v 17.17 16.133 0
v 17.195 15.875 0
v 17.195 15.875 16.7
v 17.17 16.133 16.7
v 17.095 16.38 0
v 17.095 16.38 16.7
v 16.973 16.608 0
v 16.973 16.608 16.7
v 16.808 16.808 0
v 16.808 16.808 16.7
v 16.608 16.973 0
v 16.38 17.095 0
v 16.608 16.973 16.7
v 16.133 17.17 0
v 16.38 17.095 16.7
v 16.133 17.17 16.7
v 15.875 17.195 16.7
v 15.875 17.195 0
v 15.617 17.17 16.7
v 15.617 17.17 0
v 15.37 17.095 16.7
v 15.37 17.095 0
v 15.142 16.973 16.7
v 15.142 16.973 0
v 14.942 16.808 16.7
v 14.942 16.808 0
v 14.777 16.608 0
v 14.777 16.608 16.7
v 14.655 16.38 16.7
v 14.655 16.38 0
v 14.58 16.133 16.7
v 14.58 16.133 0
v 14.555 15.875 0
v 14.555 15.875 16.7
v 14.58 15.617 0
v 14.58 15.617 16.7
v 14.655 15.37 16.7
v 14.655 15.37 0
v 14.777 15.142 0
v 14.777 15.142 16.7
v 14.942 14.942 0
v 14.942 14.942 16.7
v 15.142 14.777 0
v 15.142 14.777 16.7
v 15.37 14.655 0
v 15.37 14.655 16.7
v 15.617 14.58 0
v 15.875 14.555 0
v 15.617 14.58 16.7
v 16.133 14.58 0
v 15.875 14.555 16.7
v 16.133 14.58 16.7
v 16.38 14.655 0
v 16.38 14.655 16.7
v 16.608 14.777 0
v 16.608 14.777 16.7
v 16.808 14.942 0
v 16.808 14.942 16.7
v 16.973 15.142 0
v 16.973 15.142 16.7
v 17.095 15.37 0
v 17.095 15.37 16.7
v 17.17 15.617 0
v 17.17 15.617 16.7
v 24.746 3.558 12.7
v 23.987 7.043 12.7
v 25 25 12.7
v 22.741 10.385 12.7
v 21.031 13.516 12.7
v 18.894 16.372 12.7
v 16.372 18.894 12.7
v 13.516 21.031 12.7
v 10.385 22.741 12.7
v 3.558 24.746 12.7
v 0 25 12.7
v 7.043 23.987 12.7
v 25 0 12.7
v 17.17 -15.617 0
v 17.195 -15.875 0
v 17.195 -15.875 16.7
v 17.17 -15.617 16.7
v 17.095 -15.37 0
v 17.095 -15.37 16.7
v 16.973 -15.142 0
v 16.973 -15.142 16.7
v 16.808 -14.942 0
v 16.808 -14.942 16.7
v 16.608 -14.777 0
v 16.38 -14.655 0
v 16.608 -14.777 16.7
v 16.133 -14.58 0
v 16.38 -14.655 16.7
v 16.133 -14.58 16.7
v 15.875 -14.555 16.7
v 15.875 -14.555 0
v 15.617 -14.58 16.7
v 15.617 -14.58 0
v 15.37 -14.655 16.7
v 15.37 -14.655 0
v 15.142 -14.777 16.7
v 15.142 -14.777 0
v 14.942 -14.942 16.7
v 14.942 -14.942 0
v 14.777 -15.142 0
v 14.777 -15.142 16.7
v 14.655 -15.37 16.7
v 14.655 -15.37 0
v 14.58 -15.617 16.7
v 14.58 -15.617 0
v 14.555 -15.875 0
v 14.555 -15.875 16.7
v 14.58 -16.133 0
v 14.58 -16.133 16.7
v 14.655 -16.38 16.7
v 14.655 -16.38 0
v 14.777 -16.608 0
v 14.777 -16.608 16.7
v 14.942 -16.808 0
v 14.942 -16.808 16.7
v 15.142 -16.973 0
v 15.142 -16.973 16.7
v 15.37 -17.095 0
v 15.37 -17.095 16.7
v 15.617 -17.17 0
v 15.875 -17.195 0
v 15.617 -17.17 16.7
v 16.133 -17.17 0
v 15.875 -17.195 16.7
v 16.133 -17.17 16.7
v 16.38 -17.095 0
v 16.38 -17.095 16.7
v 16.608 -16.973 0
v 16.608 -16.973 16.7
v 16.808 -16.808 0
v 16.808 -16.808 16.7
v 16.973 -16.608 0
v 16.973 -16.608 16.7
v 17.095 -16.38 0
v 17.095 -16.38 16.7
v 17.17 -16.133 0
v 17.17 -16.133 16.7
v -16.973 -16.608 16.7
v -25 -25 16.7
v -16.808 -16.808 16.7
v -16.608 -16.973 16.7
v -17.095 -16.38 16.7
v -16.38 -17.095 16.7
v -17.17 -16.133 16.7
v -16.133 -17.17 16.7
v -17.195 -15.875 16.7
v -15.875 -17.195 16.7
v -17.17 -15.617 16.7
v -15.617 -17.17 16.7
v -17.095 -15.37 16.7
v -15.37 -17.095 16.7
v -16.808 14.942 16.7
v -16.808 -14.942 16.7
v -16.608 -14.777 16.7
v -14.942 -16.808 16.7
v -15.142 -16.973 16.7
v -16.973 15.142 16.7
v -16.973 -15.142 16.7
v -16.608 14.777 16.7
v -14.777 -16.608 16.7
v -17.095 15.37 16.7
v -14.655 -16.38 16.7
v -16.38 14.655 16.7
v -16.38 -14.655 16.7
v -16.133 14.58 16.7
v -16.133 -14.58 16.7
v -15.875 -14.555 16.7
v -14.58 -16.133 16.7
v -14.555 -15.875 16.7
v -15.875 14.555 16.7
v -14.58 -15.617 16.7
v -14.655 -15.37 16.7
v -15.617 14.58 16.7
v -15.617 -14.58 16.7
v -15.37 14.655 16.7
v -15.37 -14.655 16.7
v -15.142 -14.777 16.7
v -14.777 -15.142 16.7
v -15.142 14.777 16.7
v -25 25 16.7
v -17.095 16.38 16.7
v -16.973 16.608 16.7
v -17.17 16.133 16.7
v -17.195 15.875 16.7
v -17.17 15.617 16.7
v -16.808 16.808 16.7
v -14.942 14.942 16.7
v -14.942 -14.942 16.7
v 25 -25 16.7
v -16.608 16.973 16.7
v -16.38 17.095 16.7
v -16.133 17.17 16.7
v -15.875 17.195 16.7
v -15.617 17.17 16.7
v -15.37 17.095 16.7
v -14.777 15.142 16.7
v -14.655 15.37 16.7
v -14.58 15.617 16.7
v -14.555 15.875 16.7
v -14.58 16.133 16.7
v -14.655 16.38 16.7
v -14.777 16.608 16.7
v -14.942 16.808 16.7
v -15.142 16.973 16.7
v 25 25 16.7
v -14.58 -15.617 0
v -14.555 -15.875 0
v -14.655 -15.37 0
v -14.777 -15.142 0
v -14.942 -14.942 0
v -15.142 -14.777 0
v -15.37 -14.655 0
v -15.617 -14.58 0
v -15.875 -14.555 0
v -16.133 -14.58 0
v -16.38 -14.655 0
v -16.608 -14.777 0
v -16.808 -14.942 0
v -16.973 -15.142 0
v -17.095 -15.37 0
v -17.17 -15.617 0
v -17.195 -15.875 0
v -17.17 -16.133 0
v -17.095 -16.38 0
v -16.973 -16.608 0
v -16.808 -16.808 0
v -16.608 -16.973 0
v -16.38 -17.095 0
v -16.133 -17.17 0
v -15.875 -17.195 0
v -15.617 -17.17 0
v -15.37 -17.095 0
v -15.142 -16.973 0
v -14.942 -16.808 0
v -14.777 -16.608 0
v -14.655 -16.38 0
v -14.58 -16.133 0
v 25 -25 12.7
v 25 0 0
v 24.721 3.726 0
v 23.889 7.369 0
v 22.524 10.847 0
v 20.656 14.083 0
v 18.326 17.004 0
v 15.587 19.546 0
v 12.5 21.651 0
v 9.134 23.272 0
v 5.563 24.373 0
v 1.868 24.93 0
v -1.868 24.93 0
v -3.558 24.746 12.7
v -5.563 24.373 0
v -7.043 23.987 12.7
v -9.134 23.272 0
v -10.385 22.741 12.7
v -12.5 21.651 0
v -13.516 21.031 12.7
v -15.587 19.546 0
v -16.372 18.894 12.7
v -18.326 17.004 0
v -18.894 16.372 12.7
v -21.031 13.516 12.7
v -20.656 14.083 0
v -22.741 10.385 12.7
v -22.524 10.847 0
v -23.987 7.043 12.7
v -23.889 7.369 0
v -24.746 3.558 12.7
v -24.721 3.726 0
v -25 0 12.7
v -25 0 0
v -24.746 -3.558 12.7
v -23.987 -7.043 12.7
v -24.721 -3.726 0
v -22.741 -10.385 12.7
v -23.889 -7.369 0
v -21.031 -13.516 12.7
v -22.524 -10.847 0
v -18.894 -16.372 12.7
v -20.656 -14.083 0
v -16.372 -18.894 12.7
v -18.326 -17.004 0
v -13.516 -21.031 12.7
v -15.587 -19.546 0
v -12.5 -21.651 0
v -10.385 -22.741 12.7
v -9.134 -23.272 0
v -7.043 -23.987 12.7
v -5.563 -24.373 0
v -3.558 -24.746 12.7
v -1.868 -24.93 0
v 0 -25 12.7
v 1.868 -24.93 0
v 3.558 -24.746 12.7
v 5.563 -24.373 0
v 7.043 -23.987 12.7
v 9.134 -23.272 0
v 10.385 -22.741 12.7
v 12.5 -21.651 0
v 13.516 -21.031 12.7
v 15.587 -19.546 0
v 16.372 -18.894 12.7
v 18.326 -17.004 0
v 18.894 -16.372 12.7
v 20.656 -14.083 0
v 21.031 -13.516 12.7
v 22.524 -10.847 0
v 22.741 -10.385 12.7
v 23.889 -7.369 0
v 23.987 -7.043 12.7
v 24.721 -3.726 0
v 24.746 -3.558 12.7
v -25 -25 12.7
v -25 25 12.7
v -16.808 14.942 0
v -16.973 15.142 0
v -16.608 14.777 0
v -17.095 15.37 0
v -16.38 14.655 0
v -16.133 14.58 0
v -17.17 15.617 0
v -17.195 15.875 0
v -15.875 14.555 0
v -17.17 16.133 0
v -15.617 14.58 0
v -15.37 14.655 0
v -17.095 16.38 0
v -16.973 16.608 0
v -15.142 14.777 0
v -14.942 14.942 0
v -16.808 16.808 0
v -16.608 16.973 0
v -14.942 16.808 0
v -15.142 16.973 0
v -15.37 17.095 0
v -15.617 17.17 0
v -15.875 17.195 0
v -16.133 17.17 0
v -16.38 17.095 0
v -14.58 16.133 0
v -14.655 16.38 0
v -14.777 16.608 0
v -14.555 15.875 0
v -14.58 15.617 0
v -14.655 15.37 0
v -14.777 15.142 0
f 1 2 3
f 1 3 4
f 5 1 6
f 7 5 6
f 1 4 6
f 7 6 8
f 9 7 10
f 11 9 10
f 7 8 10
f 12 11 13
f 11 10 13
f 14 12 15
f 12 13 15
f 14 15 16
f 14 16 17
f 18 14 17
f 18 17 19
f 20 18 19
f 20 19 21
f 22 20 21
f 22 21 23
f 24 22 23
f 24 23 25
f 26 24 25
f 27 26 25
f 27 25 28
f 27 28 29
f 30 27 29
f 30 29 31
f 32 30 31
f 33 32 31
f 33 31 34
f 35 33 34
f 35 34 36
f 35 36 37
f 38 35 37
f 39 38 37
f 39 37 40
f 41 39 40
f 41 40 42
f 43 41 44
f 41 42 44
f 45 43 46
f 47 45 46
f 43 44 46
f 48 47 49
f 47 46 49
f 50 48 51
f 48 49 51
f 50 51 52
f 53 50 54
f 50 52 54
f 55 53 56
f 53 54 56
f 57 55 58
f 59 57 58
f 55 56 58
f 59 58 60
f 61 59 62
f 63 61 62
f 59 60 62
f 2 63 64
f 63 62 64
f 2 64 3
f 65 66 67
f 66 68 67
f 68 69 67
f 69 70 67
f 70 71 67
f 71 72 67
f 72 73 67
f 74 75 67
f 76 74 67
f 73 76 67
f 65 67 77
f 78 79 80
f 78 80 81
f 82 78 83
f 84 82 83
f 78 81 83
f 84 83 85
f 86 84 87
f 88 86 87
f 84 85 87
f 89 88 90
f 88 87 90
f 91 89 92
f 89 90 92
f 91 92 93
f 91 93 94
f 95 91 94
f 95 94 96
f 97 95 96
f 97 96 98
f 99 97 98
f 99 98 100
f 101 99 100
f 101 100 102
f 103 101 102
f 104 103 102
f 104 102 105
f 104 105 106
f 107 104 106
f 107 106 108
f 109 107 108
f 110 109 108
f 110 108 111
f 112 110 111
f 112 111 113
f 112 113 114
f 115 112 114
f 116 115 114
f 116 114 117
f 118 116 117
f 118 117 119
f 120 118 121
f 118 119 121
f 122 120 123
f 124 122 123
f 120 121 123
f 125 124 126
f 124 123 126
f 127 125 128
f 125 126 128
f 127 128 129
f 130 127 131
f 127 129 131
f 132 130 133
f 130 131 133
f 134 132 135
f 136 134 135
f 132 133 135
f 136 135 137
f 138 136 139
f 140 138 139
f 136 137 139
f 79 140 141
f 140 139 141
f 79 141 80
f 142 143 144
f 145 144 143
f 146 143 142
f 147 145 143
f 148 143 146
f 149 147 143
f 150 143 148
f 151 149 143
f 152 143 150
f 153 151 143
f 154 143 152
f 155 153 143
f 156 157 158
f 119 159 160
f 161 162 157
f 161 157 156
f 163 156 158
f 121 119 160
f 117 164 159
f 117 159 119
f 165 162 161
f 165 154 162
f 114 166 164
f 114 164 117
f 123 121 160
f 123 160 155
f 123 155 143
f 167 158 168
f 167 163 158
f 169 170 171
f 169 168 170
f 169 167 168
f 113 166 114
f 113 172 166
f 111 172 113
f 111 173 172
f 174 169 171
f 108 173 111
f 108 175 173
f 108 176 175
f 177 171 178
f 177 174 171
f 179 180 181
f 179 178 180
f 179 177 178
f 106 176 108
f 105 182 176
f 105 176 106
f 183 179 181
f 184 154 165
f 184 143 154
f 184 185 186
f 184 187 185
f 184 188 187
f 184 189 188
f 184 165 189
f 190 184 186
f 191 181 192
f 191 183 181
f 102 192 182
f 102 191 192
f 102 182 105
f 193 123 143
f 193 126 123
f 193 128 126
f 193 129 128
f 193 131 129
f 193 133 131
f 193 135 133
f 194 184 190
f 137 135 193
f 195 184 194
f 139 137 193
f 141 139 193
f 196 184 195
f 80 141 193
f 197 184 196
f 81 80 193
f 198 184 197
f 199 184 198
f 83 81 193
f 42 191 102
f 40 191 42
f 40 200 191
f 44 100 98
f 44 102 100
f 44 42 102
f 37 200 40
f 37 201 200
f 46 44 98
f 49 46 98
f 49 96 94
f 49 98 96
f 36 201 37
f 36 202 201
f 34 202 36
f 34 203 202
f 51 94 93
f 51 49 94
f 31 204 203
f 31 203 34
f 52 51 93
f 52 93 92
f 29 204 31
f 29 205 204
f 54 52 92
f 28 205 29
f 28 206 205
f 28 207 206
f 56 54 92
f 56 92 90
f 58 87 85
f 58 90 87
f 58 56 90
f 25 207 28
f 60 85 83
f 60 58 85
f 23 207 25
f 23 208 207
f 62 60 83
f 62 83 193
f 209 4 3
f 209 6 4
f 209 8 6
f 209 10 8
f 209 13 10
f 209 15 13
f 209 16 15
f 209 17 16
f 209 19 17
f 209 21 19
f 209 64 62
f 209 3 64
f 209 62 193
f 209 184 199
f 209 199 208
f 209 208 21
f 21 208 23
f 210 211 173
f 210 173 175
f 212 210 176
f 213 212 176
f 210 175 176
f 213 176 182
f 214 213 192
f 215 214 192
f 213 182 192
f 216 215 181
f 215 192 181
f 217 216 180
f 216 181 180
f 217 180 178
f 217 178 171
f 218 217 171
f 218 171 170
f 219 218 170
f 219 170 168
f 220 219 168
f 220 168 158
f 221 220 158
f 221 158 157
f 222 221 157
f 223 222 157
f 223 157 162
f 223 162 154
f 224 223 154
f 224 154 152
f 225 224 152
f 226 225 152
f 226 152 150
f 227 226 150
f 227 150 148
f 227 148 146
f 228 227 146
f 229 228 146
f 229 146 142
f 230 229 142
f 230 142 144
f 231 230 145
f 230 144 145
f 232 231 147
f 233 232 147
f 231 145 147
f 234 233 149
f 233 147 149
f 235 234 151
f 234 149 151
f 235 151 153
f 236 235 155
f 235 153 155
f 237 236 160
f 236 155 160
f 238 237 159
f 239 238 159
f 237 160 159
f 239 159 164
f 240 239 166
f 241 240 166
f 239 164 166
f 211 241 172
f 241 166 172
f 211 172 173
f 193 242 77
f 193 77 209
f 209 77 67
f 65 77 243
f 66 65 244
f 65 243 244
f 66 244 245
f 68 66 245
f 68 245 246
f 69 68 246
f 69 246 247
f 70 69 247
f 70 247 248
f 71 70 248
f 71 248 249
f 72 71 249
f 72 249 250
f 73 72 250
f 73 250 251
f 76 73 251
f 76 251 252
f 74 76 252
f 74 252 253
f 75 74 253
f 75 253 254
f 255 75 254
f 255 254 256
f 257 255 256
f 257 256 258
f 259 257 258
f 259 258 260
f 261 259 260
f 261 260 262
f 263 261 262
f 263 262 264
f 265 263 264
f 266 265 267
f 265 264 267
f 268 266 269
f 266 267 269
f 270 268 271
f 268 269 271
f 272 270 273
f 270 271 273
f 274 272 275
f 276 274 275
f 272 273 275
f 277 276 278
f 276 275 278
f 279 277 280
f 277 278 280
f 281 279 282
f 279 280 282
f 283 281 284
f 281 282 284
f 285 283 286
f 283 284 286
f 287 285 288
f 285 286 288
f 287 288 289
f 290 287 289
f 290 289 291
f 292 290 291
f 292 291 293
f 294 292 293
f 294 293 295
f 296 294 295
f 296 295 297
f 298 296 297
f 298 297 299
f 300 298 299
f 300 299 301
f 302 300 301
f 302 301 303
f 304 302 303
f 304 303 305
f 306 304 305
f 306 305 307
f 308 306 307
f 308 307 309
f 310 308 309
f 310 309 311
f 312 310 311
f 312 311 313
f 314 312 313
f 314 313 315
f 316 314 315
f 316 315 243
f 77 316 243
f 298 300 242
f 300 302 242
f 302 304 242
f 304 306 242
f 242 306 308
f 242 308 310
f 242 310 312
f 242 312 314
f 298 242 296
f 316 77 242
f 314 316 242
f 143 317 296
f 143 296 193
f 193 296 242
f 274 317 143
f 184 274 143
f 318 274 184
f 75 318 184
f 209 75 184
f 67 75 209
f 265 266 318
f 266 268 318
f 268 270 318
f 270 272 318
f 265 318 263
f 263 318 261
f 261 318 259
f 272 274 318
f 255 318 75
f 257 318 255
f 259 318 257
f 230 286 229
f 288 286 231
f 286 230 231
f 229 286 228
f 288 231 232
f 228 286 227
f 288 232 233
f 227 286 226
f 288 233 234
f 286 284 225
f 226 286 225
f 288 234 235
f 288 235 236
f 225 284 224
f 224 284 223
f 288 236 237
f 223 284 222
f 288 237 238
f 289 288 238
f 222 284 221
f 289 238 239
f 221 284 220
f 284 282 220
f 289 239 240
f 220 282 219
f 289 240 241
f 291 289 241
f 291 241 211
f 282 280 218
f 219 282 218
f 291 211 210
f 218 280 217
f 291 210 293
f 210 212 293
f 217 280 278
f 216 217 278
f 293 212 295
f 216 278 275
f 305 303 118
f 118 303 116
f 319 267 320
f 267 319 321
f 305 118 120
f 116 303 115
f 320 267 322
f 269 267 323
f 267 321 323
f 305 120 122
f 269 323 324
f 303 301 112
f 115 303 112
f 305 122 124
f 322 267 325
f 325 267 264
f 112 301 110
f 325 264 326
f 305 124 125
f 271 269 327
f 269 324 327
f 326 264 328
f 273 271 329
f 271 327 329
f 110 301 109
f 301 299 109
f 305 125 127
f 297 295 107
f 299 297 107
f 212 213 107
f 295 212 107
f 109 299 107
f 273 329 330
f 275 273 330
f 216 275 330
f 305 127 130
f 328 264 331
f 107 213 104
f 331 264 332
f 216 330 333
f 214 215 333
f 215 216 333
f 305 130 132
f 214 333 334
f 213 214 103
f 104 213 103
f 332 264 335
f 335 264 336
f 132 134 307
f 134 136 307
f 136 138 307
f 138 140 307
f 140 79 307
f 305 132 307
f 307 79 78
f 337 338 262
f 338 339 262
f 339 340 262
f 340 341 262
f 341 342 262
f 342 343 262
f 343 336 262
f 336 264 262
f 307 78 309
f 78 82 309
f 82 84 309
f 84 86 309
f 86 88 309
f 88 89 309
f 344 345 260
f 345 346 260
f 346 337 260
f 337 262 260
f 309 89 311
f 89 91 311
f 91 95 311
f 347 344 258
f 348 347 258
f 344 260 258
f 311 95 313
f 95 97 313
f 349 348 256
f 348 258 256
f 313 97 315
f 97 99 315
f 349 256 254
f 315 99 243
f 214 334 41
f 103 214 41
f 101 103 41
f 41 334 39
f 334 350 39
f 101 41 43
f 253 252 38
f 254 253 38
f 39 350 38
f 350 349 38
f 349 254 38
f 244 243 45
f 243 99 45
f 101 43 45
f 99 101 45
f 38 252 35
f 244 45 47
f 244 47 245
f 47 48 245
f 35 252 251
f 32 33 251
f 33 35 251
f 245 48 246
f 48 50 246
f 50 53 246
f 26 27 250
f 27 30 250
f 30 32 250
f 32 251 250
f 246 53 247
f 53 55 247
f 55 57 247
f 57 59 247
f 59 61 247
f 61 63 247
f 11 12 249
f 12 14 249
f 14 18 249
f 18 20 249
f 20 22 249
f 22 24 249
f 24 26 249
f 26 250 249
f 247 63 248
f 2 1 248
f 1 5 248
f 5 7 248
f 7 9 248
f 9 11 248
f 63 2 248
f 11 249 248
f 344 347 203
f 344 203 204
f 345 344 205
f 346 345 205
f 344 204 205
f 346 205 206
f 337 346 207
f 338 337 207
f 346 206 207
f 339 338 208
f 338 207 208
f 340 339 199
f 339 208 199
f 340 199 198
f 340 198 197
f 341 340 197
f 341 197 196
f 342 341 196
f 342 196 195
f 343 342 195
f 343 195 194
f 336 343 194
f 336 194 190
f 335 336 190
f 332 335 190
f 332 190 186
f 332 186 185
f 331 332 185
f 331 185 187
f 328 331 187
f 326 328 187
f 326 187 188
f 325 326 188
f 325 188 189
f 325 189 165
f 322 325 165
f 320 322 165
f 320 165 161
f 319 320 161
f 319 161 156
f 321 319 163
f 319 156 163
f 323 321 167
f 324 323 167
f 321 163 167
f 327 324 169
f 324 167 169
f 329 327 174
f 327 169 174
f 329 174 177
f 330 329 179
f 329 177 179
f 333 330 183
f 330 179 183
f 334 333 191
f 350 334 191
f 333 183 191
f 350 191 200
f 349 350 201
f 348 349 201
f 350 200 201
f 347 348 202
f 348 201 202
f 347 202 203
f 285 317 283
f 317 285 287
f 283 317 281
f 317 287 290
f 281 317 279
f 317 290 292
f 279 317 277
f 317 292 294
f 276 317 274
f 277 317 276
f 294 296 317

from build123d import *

# Parameters (mm, degrees)
SKETCH1_R           = 25
BOSS_EXTRUDE1_DEPTH = 12.7
SKETCH2_W           = 50
SKETCH2_H           = 50
BOSS_EXTRUDE2_DEPTH = 4
SKETCH3_R           = 1.32
CUT_EXTRUDE1_DEPTH  = 17.7


with BuildPart() as part:
    # Sketch1 → Boss-Extrude1 (new body)
    with BuildSketch(Plane.XY):
        Circle(SKETCH1_R)
    extrude(amount=BOSS_EXTRUDE1_DEPTH)

    # Sketch2 → Boss-Extrude2 (add)
    with BuildSketch(Plane.XY.offset(12.7)):
        Rectangle(SKETCH2_W, SKETCH2_H)
    extrude(amount=BOSS_EXTRUDE2_DEPTH)

    # Sketch3 → Cut-Extrude1 (cut, through all)
    with BuildSketch(Plane.XY.offset(16.7)):
        with Locations((-15.875, 15.875)):
            Circle(SKETCH3_R)
        with Locations((15.875, 15.875)):
            Circle(SKETCH3_R)
        with Locations((15.875, -15.875)):
            Circle(SKETCH3_R)
        with Locations((-15.875, -15.875)):
            Circle(SKETCH3_R)
    extrude(amount=-CUT_EXTRUDE1_DEPTH, mode=Mode.SUBTRACT)


solid = part.part
